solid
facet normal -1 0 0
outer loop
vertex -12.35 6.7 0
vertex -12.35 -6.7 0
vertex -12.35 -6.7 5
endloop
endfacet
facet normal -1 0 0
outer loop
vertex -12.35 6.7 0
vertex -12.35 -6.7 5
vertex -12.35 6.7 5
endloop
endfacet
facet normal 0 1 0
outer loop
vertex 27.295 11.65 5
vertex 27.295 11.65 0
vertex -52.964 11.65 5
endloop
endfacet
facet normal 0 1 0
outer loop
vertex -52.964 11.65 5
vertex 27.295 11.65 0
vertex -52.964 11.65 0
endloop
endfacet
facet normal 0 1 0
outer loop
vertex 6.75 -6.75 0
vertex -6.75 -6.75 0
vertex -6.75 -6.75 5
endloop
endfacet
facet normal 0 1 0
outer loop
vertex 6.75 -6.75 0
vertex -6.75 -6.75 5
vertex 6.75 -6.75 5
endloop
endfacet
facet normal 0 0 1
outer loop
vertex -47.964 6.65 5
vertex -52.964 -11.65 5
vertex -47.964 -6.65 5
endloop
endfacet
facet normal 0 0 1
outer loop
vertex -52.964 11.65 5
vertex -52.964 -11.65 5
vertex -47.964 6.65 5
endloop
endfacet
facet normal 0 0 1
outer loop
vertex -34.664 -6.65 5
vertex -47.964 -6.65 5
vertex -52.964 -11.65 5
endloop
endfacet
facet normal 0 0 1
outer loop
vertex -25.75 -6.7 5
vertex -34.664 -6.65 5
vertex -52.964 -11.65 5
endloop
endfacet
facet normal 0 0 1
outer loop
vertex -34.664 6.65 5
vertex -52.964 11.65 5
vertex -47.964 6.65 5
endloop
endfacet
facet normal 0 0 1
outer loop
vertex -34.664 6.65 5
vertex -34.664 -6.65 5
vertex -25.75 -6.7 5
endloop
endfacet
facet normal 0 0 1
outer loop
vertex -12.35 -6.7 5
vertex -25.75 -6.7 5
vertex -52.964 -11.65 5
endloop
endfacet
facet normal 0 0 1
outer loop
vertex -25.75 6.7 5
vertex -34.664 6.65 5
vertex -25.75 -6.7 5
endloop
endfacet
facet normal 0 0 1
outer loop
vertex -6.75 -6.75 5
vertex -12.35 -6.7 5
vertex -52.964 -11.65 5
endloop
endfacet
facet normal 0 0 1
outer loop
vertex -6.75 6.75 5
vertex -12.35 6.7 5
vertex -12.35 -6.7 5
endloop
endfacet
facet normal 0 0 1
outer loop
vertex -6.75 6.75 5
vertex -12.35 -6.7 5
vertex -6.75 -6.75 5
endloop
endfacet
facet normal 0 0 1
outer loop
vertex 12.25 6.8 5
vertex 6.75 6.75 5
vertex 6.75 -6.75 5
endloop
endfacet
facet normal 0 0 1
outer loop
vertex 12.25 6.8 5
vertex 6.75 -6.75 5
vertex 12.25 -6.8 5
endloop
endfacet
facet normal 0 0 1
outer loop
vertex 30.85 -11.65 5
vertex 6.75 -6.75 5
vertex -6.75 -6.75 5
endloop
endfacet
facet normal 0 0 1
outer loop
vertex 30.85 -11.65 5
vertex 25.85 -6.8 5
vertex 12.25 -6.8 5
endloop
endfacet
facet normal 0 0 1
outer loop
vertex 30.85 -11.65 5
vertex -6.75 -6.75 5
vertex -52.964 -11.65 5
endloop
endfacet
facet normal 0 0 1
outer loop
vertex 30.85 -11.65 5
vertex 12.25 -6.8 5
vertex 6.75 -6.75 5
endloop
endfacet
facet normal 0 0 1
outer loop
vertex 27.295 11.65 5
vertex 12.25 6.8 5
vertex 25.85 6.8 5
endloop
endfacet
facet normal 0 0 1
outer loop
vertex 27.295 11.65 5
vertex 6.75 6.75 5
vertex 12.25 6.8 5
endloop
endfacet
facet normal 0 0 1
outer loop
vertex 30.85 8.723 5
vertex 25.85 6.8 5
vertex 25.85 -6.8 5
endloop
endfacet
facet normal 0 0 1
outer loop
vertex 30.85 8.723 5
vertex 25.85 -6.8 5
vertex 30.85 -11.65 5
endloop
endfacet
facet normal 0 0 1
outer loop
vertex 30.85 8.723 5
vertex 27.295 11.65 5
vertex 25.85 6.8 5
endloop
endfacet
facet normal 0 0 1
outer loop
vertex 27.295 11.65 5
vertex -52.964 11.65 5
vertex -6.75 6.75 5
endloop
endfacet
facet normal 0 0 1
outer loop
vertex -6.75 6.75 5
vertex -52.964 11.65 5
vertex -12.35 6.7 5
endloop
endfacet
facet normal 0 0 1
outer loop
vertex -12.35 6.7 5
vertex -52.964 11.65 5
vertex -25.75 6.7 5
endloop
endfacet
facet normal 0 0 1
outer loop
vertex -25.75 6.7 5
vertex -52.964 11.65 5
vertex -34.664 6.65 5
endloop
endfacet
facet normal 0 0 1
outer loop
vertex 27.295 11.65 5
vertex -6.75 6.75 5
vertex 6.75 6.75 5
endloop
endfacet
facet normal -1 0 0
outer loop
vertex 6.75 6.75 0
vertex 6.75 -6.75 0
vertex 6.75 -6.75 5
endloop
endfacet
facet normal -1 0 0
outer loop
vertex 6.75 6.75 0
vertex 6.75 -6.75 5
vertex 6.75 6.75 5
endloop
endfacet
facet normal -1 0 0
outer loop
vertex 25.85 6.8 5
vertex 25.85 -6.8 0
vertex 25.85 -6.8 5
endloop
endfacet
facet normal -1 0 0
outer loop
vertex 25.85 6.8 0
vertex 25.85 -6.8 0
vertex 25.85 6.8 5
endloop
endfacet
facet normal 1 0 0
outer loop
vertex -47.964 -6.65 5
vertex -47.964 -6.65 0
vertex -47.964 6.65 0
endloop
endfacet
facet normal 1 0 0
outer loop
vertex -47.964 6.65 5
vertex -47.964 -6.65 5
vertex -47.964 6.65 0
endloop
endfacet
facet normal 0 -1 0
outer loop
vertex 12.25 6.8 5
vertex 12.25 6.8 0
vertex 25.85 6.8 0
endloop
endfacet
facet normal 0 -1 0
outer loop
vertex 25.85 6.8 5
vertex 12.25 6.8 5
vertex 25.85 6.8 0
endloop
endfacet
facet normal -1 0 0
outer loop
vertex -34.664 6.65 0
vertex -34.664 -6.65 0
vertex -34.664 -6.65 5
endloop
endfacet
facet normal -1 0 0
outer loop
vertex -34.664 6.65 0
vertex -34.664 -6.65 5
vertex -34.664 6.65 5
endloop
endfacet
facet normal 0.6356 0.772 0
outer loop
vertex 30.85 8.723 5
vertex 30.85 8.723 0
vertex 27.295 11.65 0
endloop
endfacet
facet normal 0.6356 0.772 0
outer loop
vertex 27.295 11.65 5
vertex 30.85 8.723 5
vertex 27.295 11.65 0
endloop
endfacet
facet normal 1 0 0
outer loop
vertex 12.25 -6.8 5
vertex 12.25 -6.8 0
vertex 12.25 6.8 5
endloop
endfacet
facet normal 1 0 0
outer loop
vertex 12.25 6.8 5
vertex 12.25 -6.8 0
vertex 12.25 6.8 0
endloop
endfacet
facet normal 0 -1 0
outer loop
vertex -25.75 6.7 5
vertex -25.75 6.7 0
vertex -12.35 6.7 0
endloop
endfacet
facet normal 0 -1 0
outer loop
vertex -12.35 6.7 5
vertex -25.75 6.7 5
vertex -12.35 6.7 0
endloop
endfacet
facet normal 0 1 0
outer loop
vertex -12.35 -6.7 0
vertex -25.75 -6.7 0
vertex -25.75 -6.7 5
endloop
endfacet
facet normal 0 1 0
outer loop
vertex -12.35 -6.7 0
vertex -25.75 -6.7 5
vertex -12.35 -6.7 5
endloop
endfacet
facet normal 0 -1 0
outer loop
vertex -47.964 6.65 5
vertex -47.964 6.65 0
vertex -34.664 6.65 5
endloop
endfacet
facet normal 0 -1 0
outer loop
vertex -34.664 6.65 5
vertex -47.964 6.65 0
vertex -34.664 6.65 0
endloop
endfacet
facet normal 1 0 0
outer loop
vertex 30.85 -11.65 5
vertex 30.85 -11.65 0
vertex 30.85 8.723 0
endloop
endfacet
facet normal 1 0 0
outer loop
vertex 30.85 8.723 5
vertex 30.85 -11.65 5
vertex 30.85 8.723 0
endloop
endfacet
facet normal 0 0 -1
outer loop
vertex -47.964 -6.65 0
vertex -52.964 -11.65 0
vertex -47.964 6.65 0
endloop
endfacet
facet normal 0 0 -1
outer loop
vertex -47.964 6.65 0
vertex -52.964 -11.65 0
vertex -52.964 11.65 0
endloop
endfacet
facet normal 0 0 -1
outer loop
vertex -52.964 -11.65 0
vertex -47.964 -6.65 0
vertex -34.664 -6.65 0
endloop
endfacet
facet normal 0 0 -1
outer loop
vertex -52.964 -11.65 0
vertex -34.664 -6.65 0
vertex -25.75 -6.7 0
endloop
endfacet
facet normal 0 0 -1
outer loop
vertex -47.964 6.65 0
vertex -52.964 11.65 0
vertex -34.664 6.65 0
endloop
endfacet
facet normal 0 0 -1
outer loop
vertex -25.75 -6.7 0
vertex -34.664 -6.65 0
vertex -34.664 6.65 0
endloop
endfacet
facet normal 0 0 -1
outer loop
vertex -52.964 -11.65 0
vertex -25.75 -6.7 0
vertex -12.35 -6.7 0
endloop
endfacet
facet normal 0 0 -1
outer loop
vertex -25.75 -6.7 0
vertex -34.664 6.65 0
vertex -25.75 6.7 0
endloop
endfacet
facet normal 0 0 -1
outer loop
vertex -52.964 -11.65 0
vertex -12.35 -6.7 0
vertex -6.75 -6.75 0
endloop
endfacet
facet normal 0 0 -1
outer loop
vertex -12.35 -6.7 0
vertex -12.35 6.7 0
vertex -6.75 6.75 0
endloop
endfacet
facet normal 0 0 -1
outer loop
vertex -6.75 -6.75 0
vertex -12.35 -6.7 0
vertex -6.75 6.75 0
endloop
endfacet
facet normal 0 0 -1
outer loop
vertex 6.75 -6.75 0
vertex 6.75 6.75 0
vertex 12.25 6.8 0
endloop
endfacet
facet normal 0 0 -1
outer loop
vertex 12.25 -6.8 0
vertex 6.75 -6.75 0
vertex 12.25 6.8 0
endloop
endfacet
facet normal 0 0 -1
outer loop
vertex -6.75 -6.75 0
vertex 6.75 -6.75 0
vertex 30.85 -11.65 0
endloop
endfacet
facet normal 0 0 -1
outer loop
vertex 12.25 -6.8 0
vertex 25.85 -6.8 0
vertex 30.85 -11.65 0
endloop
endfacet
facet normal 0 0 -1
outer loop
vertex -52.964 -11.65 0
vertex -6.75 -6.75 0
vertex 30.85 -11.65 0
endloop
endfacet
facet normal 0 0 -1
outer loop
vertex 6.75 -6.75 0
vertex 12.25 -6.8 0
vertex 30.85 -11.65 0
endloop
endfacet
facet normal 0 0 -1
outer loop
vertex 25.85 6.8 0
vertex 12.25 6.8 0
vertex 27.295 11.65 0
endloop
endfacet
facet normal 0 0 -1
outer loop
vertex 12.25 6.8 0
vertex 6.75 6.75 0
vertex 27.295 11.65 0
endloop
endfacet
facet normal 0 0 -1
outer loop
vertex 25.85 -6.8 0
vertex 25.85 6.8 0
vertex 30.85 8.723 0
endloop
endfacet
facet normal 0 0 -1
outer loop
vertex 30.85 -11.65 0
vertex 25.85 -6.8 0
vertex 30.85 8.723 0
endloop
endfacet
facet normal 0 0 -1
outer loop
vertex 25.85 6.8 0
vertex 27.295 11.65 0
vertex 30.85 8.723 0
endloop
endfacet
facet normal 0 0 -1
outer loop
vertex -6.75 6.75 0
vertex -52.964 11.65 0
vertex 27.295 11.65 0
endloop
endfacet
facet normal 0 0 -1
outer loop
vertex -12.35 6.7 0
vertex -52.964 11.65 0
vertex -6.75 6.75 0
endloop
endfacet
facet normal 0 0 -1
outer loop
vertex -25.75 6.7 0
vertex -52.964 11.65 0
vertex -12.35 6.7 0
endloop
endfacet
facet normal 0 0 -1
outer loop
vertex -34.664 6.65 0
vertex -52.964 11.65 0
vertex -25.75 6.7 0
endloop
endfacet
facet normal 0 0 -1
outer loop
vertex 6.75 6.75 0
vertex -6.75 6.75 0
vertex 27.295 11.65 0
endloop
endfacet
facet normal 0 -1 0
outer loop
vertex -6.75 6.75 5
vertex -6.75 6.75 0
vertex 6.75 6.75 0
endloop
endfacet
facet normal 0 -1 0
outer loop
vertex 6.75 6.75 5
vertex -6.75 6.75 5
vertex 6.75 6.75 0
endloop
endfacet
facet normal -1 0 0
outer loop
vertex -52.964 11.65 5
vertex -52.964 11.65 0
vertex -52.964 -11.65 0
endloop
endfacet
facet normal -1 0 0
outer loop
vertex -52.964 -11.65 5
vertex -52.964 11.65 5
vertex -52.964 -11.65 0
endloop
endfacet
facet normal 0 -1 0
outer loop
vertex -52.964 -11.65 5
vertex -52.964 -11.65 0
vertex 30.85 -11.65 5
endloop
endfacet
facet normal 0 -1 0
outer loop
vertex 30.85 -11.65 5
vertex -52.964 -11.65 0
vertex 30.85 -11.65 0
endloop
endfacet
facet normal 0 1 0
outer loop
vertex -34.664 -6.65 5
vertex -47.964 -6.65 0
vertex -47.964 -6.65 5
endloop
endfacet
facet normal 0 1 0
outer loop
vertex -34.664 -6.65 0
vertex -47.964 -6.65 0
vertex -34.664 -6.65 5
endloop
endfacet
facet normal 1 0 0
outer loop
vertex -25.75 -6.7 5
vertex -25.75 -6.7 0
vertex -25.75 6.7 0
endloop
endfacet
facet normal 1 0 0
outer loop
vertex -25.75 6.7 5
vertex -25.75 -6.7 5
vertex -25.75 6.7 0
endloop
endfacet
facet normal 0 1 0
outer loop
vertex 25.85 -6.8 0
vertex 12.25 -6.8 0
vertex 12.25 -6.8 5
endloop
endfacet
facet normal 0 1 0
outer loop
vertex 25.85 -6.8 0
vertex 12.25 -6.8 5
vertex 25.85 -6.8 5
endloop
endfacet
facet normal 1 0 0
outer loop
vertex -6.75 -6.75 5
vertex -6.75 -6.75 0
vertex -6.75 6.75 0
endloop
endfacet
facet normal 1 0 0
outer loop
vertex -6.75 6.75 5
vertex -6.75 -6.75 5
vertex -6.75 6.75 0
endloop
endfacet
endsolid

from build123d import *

# Parameters (mm, degrees)
F0_W     = 13.3
F0_H     = 13.3
F0_W_2   = 13.4
F0_H_2   = 13.4
F0_W_3   = 13.5
F0_H_3   = 13.5
F0_W_4   = 13.6
F0_H_4   = 13.6
F1_DEPTH = 5


with BuildPart() as f1:
    # F0 (on Top) → F1 (new body)
    with BuildSketch(Plane.XY):
        Polygon((27.294878, 11.65), (-52.963719, 11.65), (-52.963719, -11.65), (30.85, -11.65), (30.85, 8.722694), align=None)
        with Locations((-41.313719, 0)):
            Rectangle(F0_W, F0_H, mode=Mode.SUBTRACT)
        with Locations((-19.05, 0)):
            Rectangle(F0_W_2, F0_H_2, mode=Mode.SUBTRACT)
        Rectangle(F0_W_3, F0_H_3, mode=Mode.SUBTRACT)
        with Locations((19.05, 0)):
            Rectangle(F0_W_4, F0_H_4, mode=Mode.SUBTRACT)
    extrude(amount=F1_DEPTH)


solid = f1.part
